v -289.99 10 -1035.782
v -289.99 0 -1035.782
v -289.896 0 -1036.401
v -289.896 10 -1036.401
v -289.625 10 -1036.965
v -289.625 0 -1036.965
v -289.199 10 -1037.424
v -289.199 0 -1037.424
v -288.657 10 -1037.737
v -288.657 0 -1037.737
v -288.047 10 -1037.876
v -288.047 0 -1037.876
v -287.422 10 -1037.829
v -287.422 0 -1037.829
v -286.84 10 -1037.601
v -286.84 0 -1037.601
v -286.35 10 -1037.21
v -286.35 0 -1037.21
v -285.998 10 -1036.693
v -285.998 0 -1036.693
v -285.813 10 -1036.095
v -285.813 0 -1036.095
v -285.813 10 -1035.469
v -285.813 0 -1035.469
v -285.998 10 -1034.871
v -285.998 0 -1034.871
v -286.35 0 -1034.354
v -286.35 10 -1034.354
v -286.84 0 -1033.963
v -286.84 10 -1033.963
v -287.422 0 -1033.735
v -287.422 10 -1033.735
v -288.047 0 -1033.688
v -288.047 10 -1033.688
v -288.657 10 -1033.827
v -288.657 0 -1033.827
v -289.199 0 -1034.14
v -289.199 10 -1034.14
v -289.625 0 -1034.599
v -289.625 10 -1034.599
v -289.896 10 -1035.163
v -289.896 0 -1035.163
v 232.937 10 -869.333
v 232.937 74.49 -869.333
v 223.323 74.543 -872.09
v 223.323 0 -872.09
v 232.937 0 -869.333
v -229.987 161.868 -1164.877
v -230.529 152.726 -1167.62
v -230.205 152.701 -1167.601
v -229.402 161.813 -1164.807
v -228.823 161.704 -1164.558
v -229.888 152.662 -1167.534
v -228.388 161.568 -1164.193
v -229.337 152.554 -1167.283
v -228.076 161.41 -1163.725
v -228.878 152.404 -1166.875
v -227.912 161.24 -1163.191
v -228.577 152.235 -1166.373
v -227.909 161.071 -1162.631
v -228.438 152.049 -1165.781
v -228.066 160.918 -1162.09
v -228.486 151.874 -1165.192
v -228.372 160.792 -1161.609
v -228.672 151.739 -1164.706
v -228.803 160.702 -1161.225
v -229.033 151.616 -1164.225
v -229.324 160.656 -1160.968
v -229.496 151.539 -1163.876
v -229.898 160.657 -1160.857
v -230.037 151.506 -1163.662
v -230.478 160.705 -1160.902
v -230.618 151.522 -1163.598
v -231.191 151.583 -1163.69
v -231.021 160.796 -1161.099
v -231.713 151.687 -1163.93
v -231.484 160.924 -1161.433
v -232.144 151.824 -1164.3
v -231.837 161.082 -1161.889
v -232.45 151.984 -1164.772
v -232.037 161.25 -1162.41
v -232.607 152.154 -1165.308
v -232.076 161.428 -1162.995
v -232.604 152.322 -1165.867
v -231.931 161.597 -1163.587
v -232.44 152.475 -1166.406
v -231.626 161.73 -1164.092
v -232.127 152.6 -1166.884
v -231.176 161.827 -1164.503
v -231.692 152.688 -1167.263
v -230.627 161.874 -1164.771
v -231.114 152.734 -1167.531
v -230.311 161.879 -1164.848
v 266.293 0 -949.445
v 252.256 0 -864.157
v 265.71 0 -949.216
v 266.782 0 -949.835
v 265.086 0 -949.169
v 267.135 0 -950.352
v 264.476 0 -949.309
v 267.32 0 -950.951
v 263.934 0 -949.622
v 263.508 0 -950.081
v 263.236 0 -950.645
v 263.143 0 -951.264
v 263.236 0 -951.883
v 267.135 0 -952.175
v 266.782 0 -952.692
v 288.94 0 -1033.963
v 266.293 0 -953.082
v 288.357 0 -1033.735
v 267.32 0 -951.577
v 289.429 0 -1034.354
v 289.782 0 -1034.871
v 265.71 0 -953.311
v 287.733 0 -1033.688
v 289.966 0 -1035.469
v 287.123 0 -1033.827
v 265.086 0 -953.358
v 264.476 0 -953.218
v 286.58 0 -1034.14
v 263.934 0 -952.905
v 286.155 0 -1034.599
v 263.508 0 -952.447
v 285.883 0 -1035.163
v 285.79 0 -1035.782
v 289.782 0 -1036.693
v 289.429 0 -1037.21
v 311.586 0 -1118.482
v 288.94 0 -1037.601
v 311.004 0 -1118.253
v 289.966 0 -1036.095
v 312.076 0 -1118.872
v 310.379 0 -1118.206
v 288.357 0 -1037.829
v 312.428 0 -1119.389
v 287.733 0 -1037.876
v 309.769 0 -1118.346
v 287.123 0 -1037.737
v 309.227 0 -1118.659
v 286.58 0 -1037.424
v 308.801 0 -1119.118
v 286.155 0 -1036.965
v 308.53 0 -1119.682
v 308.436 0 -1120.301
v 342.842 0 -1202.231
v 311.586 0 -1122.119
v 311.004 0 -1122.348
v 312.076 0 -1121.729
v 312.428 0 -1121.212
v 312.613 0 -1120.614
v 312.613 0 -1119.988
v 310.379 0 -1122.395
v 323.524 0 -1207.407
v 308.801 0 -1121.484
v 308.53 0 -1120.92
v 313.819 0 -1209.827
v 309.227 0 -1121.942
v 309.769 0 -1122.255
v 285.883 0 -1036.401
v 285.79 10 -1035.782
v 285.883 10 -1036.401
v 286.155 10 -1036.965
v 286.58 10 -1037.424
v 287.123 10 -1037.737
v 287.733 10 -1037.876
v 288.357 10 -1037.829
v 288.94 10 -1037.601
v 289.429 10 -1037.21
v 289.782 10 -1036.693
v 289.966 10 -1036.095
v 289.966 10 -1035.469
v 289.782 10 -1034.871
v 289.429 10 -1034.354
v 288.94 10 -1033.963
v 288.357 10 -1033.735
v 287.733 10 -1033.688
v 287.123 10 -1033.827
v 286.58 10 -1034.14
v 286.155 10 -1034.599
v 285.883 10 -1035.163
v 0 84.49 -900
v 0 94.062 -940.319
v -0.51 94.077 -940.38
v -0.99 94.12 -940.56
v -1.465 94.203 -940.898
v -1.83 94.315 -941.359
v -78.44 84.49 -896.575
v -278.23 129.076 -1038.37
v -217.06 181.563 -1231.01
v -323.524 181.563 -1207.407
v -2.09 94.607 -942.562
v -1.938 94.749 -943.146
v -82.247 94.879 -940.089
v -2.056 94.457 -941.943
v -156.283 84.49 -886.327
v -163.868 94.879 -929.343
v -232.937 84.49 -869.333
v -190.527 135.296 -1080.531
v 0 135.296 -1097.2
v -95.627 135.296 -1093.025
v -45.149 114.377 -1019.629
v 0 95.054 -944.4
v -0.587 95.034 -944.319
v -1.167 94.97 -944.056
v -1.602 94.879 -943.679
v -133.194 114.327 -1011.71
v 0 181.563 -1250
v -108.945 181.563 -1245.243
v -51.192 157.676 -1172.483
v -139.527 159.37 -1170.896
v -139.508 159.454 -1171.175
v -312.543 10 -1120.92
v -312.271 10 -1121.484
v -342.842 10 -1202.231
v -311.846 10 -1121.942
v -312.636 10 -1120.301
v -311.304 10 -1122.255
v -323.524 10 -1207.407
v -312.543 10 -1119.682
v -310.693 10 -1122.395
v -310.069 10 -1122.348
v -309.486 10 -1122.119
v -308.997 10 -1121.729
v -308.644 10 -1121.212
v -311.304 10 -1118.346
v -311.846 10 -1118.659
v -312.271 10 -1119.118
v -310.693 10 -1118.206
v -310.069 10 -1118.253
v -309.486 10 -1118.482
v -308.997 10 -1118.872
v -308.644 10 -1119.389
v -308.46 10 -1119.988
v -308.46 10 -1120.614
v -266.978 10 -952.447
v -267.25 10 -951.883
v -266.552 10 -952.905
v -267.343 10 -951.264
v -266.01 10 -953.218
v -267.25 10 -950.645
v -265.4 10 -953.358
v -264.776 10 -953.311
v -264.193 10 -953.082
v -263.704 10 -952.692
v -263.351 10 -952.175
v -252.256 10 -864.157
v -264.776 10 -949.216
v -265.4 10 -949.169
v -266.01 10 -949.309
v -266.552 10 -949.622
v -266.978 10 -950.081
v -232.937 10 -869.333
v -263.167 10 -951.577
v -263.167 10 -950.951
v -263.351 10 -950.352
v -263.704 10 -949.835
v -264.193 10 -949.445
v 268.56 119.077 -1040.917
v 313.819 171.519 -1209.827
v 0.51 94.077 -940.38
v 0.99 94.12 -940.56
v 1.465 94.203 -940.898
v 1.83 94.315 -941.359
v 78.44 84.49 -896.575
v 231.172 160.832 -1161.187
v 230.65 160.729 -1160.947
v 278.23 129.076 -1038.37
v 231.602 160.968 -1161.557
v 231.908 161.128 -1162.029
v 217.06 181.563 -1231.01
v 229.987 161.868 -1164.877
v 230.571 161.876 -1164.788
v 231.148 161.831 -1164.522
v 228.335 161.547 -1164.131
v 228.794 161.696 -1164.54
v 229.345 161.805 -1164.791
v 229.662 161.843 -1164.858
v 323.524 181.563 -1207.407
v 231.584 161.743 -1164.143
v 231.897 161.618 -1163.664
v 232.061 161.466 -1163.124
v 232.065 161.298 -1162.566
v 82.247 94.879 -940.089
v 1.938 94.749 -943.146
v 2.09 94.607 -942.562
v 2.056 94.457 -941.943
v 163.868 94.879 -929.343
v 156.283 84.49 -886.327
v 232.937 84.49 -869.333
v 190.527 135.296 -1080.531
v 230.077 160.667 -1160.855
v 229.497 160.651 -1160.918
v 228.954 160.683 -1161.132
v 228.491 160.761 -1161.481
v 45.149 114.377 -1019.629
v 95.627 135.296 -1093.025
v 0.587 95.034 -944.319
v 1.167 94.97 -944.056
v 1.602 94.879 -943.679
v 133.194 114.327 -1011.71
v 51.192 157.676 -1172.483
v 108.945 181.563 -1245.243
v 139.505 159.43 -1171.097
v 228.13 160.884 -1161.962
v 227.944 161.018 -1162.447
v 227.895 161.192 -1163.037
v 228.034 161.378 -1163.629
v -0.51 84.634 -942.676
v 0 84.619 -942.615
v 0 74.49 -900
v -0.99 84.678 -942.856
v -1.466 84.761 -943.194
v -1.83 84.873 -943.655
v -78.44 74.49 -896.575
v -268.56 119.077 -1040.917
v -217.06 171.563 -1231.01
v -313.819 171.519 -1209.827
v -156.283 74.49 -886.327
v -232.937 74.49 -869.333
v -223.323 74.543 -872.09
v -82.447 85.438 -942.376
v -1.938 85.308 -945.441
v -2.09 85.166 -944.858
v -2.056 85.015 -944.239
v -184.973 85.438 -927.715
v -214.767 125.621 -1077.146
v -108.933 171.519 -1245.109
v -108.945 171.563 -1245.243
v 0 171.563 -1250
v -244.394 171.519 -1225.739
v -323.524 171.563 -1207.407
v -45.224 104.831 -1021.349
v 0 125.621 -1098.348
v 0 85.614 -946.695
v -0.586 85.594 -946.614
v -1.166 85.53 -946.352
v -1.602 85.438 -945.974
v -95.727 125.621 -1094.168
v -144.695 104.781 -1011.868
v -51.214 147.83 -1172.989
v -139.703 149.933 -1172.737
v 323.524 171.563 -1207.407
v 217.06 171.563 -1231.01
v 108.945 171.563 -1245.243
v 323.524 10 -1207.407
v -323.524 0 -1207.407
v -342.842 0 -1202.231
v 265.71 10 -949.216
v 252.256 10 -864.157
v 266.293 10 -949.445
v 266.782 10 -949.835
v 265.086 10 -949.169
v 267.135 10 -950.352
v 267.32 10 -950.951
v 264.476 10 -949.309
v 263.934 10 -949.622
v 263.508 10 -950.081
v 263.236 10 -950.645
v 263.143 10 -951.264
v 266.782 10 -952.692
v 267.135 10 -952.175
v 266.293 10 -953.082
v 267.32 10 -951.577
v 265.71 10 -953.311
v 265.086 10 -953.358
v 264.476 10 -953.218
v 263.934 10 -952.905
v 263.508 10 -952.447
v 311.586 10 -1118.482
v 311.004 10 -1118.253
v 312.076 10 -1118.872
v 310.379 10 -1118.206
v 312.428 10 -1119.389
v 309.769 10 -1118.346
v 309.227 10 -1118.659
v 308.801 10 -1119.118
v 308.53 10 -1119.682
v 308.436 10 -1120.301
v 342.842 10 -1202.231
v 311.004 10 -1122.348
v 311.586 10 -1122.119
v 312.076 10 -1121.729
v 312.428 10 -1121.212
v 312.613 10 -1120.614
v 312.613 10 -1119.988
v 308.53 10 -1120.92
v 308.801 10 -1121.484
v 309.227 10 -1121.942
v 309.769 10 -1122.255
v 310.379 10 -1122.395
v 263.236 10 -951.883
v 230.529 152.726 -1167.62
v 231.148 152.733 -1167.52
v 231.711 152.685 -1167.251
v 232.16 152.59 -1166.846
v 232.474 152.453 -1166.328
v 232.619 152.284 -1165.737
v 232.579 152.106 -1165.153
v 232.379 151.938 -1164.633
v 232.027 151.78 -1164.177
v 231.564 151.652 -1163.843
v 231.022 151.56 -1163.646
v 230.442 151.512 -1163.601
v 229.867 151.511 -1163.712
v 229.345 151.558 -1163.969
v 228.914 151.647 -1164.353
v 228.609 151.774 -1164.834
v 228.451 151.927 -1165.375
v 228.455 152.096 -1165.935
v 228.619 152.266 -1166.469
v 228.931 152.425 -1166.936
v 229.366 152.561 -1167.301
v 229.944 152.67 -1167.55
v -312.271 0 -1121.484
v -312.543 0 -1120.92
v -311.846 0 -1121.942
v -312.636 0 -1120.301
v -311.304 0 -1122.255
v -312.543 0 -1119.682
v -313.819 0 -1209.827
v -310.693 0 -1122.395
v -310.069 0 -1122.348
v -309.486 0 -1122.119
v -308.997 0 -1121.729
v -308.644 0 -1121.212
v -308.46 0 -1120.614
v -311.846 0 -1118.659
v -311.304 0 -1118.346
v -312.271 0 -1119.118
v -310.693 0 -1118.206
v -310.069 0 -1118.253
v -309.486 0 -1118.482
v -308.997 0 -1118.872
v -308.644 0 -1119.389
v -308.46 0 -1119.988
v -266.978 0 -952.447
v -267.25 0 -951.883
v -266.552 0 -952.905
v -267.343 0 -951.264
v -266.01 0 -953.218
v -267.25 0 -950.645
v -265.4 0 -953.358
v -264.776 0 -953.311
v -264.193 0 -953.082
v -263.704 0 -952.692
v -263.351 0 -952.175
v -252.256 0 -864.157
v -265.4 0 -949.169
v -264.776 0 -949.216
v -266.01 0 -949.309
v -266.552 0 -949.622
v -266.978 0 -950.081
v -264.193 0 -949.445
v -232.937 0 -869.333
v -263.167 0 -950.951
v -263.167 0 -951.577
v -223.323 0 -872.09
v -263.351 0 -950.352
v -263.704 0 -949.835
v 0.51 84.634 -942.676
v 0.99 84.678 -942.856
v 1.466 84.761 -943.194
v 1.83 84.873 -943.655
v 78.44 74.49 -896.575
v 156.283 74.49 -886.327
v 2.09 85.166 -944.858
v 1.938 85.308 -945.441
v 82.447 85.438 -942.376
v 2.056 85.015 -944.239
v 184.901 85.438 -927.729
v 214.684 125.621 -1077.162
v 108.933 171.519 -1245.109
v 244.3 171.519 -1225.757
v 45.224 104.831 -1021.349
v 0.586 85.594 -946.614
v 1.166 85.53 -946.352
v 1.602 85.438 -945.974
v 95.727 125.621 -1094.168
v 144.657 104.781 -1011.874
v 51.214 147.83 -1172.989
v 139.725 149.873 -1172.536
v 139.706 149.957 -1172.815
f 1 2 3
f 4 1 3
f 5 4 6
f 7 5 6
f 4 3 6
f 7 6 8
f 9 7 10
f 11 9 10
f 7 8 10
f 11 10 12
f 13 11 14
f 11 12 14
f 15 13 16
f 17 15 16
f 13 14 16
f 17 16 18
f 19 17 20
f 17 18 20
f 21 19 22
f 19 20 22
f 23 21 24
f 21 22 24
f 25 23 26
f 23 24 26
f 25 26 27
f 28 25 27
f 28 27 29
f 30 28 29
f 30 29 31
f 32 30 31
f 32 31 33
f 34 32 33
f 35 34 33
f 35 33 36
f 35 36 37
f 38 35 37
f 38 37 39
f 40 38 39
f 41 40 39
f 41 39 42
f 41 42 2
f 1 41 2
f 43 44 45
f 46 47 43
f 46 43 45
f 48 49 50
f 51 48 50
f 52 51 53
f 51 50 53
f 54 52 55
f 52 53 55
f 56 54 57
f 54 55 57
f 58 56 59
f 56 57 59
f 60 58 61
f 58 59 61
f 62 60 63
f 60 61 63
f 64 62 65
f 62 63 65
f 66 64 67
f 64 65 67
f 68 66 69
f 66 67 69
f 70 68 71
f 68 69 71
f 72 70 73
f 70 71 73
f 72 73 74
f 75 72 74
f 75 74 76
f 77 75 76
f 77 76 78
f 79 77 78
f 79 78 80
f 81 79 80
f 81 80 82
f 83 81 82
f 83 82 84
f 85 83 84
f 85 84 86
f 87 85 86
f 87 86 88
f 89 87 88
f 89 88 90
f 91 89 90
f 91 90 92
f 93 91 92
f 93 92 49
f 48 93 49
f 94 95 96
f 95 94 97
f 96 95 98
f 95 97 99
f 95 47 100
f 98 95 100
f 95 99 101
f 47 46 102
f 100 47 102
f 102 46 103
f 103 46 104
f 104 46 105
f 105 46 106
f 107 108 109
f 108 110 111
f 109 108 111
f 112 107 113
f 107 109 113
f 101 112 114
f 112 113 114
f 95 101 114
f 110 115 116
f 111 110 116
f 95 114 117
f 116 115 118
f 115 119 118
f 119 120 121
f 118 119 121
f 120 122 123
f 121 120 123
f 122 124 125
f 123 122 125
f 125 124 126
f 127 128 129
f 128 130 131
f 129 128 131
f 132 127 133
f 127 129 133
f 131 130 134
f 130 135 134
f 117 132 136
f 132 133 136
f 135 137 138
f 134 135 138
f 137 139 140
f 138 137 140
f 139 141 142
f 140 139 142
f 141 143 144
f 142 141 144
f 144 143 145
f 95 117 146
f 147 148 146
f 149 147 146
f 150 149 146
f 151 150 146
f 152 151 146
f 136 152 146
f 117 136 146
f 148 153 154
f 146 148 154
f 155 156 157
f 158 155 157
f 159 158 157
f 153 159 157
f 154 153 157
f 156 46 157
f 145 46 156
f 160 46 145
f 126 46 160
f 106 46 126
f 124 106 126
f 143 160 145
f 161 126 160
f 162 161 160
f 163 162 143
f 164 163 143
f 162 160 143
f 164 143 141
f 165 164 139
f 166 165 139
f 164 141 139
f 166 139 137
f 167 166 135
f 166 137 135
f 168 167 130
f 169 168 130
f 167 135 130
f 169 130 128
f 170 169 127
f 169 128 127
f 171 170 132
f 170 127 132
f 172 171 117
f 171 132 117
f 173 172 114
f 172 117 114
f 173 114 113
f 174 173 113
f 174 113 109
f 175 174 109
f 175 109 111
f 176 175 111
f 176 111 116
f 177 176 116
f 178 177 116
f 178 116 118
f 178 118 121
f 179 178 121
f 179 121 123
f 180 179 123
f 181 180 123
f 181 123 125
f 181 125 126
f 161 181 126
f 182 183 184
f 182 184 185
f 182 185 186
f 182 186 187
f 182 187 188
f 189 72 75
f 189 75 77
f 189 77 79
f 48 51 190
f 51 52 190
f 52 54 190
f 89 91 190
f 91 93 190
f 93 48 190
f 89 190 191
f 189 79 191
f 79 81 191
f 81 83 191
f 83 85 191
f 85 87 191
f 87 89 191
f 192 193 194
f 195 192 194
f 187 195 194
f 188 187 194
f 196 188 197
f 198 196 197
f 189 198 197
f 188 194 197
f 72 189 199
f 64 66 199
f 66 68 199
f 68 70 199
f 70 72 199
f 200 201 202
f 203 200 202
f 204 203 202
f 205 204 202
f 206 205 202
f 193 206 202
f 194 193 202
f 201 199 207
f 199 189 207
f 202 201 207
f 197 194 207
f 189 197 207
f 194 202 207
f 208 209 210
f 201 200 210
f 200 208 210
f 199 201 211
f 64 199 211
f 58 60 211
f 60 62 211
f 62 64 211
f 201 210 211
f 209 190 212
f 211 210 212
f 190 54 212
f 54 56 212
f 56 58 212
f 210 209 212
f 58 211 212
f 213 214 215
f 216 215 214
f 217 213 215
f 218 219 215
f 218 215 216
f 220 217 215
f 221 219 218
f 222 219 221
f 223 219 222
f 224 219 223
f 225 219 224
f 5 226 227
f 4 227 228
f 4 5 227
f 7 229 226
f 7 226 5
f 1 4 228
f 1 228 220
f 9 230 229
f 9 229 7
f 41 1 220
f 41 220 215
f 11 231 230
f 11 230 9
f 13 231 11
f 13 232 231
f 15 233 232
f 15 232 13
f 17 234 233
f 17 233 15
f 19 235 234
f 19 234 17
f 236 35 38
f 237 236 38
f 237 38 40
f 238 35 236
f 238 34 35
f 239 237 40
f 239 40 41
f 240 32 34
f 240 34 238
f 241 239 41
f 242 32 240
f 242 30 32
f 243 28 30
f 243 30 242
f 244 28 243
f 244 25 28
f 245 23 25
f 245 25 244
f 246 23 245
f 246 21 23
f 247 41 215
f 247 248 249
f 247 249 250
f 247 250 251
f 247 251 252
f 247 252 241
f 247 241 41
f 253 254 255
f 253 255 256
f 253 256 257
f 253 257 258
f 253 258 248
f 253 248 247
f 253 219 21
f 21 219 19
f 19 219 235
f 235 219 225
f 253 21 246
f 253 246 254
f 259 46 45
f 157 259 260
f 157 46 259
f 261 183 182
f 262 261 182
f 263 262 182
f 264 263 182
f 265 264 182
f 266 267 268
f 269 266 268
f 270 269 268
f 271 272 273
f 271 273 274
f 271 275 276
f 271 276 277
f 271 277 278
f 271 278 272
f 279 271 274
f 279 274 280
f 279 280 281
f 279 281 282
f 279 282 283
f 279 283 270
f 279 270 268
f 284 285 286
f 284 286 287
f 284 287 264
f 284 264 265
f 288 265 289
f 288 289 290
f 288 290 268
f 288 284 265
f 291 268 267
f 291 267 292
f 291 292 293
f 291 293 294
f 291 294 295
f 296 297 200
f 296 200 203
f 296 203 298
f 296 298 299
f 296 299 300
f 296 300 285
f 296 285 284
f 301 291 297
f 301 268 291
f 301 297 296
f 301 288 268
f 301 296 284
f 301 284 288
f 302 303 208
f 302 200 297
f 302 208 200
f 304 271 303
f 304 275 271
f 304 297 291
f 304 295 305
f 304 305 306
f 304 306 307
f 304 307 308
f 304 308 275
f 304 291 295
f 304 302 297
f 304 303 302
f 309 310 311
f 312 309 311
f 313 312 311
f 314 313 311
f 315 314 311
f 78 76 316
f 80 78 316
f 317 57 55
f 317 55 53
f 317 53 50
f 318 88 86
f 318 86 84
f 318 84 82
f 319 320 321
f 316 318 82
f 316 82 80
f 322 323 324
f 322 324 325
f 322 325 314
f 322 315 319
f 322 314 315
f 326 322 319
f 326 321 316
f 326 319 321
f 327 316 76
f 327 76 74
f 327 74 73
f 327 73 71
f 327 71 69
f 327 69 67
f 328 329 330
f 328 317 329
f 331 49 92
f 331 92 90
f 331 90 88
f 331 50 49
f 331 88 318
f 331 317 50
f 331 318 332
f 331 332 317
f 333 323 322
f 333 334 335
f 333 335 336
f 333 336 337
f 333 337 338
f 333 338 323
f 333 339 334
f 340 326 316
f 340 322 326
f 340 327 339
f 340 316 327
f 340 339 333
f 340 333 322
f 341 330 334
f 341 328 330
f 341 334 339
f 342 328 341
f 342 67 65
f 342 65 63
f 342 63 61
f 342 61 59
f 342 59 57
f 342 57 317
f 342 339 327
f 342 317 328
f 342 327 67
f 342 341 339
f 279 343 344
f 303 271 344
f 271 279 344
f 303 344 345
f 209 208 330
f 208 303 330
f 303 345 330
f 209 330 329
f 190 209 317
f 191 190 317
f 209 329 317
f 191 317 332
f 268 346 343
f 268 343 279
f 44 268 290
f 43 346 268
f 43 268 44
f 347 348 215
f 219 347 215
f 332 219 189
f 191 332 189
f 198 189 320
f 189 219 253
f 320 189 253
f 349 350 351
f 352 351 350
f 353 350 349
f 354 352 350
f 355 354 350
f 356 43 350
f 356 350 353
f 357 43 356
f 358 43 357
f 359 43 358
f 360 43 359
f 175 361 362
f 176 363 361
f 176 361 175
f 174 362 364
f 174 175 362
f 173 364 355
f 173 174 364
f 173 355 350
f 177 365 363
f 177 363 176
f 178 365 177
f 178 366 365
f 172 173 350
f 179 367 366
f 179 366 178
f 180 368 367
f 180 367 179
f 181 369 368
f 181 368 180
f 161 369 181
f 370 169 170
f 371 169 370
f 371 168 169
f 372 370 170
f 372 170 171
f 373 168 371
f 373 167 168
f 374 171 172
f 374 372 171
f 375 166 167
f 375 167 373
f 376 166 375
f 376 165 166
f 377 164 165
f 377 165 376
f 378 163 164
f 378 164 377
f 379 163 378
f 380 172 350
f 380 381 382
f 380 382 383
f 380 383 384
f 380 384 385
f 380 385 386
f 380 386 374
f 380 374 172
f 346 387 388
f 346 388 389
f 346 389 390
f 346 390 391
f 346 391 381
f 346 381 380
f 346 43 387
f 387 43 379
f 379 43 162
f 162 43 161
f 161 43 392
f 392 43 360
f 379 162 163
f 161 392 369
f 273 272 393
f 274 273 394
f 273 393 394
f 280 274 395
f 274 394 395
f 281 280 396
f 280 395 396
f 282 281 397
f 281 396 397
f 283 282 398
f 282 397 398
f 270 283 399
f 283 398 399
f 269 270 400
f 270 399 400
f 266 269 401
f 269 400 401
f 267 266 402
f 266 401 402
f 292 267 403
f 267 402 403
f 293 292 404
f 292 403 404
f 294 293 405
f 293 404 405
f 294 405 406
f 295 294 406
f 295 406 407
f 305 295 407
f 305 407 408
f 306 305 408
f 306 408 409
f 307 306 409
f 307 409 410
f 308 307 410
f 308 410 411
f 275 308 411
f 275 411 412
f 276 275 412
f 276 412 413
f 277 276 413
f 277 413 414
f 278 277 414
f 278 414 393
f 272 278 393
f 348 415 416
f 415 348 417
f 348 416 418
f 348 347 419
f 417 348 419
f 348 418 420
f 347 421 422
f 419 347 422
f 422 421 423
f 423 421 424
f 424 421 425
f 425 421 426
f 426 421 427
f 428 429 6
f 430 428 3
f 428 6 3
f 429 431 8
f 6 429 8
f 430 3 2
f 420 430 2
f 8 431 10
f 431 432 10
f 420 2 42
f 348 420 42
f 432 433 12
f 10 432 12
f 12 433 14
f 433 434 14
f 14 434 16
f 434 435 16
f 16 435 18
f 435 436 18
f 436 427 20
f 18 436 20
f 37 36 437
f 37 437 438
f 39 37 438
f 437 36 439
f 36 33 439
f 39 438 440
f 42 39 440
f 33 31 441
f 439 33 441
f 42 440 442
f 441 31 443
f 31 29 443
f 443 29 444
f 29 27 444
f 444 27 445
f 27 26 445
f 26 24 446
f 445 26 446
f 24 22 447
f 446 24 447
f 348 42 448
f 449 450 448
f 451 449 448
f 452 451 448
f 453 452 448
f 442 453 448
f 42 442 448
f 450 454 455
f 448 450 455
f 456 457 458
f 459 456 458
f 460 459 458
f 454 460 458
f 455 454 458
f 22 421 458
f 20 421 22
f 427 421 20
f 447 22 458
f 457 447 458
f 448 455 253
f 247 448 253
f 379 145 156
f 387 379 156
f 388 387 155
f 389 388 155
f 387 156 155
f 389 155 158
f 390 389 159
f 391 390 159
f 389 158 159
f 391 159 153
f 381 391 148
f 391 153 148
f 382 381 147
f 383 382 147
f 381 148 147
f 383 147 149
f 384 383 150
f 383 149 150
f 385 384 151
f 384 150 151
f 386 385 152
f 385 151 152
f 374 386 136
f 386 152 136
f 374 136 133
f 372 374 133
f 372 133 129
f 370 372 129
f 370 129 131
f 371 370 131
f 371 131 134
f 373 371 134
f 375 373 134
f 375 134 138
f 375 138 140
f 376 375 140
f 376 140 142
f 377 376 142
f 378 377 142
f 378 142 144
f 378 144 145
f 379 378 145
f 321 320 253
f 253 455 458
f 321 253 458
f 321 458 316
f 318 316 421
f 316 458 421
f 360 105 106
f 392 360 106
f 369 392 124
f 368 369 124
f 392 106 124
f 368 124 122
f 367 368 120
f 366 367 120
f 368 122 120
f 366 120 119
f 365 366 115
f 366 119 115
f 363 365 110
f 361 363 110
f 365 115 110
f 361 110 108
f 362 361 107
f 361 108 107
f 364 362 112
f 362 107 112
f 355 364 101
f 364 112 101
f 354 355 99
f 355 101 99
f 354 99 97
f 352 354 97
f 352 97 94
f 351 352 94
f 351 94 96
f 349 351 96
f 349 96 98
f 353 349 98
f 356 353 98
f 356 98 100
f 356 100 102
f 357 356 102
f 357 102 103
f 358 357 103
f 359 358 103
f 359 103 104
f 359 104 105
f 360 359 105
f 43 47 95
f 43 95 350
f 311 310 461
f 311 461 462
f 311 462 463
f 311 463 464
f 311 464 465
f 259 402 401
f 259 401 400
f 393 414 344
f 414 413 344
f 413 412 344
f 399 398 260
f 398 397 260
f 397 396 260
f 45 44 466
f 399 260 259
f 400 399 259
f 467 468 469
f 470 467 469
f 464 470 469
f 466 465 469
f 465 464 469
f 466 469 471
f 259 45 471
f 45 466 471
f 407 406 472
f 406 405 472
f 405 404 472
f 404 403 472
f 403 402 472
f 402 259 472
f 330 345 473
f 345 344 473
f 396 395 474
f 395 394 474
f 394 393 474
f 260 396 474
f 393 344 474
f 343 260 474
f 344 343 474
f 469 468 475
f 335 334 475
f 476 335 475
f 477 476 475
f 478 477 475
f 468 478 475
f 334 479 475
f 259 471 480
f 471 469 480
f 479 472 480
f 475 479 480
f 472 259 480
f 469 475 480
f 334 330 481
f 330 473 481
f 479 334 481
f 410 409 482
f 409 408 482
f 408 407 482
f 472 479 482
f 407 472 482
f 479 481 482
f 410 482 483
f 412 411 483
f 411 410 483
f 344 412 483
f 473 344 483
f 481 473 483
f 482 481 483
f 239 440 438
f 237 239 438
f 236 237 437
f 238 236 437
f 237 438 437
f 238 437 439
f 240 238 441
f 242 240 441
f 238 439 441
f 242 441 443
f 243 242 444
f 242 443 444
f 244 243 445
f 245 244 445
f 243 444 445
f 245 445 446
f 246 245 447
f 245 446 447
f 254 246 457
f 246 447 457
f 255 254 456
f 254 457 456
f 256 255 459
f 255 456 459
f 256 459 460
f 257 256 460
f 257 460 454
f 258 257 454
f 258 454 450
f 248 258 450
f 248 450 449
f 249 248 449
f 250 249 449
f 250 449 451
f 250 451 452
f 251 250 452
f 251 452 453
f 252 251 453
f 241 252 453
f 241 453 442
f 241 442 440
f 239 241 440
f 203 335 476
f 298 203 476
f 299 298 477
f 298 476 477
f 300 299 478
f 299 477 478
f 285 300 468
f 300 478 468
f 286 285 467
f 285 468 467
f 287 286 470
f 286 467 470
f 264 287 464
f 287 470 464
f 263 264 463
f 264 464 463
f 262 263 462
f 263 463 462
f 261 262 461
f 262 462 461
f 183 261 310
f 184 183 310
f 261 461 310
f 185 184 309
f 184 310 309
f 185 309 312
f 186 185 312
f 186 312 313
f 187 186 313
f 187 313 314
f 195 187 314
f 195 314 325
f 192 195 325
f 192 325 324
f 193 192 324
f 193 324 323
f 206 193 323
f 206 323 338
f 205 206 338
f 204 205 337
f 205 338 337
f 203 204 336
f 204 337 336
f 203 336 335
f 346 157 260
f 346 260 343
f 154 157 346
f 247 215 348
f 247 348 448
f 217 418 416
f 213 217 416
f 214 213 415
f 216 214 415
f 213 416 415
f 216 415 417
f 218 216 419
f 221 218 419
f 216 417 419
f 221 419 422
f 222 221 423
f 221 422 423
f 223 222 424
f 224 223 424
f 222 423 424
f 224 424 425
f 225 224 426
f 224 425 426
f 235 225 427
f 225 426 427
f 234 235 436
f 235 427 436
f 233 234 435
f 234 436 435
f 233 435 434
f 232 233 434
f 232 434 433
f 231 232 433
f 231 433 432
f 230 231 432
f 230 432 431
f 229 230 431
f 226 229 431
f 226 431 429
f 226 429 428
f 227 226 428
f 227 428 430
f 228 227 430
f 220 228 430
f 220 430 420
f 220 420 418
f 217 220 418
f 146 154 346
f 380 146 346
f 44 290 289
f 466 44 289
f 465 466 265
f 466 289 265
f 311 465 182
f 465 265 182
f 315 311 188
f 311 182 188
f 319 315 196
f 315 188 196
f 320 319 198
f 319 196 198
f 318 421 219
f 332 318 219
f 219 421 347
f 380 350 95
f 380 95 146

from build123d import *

# Parameters (mm, degrees)
REVOLVE_1_ANGLE             = 15
REVOLVE_1_OTHER_WAY_ANGLE   = 15
EXTRUDE_1_REACH             = 1305.891
SKETCH_6_W                  = 350.000000001
SKETCH_6_H                  = 10
EXTRUDE_2_DEPTH             = 20
SKETCH_7_W                  = 350.000000001
SKETCH_7_H                  = 10
EXTRUDE_3_DEPTH             = 20
HOLE_WIZARD_M51_D           = 4.2
HOLE_WIZARD_M51_ON_FACE_2_D = 4.2
HOLE_WIZARD_M51_ON_FACE_3_D = 4.2
HOLE_WIZARD_M52_D           = 4.2


with BuildPart() as part:
    # Эскиз2 → Повернуть1 (revolve)
    with BuildSketch(Plane(origin=(0, 0, 0), x_dir=(0, 0, -1), z_dir=(1, 0, 0))):
        with BuildLine():
            Line((1250.000000001, 181.562500008), (1250.000000001, 171.562500008))
            add(Edge.make_bspline(
                [(900, 74.490000004), (1075.000000001, 115.125000006), (1250.000000001, 171.562500008)],
                knots=[0.083425123, 0.083425123, 0.083425123, 0.917676354, 0.917676354, 0.917676354], degree=2))
            Line((900, 74.490000004), (900, 84.490000004))
            add(Edge.make_bspline(
                [(900, 84.490000004), (1075.000000001, 125.125000006), (1250.000000001, 181.562500008)],
                knots=[0.083425123, 0.083425123, 0.083425123, 0.917676354, 0.917676354, 0.917676354], degree=2))
        make_face()
    revolve(axis=Axis((0, 605.286784652, 0), (0, -1, 0)), revolution_arc=REVOLVE_1_ANGLE)

    # Эскиз2 → Повернуть1 other way (revolve)
    with BuildSketch(Plane(origin=(0, 0, 0), x_dir=(0, 0, -1), z_dir=(1, 0, 0))):
        with BuildLine():
            Line((1250.000000001, 181.562500008), (1250.000000001, 171.562500008))
            add(Edge.make_bspline(
                [(900, 74.490000004), (1075.000000001, 115.125000006), (1250.000000001, 171.562500008)],
                knots=[0.083425123, 0.083425123, 0.083425123, 0.917676354, 0.917676354, 0.917676354], degree=2))
            Line((900, 74.490000004), (900, 84.490000004))
            add(Edge.make_bspline(
                [(900, 84.490000004), (1075.000000001, 125.125000006), (1250.000000001, 181.562500008)],
                knots=[0.083425123, 0.083425123, 0.083425123, 0.917676354, 0.917676354, 0.917676354], degree=2))
        make_face()
    revolve(axis=Axis((0, 605.286784652, 0), (0, 1, 0)), revolution_arc=REVOLVE_1_OTHER_WAY_ANGLE)

    # Эскиз5 → Бобышка-Вытянуть1 (add, up to next)
    with BuildSketch(Plane(origin=(0, 0, 0), x_dir=(1, 0, 0), z_dir=(0, 1, 0)), mode=Mode.PRIVATE) as extrude_1_sk1:
        Polygon((-323.523806378, 1207.407282862), (-232.937140592, 869.33324366), (-223.323059362, 872.090037092), (-313.819371083, 1209.826870333), align=None)
    extrude_1_tool1 = extrude(extrude_1_sk1.sketch, amount=EXTRUDE_1_REACH, mode=Mode.PRIVATE) - part.part
    # Эскиз5 → Бобышка-Вытянуть1 (add, up to next)
    with BuildSketch(Plane(origin=(0, 0, 0), x_dir=(1, 0, 0), z_dir=(0, 1, 0)), mode=Mode.PRIVATE) as extrude_1_sk2:
        Polygon((323.523806378, 1207.407282862), (232.937140592, 869.33324366), (223.323059362, 872.090037092), (313.819371083, 1209.826870333), align=None)
    extrude_1_tool2 = extrude(extrude_1_sk2.sketch, amount=EXTRUDE_1_REACH, mode=Mode.PRIVATE) - part.part
    add(extrude_1_tool1.solids().sort_by_distance((-273.401648, 0, -1039.664143))[0])
    add(extrude_1_tool2.solids().sort_by_distance((273.401648, 0, -1039.664143))[0])

    # Эскиз6 → Бобышка-Вытянуть2 (add)
    with BuildSketch(Plane(origin=(0, 0, 0), x_dir=(0.25881904510252135, 0, 0.9659258262890682), z_dir=(-0.9659258262890681, 0, 0.2588190451025213))):
        with Locations((-1075, 5)):
            Rectangle(SKETCH_6_W, SKETCH_6_H)
    extrude(amount=EXTRUDE_2_DEPTH)

    # Эскиз7 → Бобышка-Вытянуть3 (add)
    with BuildSketch(Plane(origin=(0, 0, 0), x_dir=(0.25881904510252124, 0, -0.9659258262890682), z_dir=(0.9659258262890682, 0, 0.25881904510252124))):
        with Locations((1075, 5)):
            Rectangle(SKETCH_7_W, SKETCH_7_H)
    extrude(amount=EXTRUDE_3_DEPTH)

    # Отверстие обработанное метчиком M51 (through all)
    with Locations(Plane(origin=(229.986727308, 161.264444267, -1162.865785876), x_dir=(0, -0.28736490905, 0.957821178011), z_dir=(-0.056742261531, 0.956277993991, 0.286901923948))):
        with Locations((0, 0)):
            Hole(HOLE_WIZARD_M51_D / 2)

    # Отверстие обработанное метчиком M51 on face 2 (through all)
    with Locations(Plane(origin=(-229.986727308, 161.264444267, -1162.865785876), x_dir=(0, -0.287364977278, 0.957821157542), z_dir=(0.056741999278, 0.95627798783, 0.286901996349))):
        with Locations((0, 0)):
            Hole(HOLE_WIZARD_M51_ON_FACE_2_D / 2)

    # Отверстие обработанное метчиком M51 on face 3 (through all)
    with Locations(Plane(origin=(0, 94.55738613, -942.359672798), x_dir=(0, -0.23624700812, 0.971693033398), z_dir=(0, 0.971693033398, 0.23624700812))):
        with Locations((-1e-09, 0)):
            Hole(HOLE_WIZARD_M51_ON_FACE_3_D / 2)

    # Отверстие обработанное метчиком M52 (through all)
    with Locations(Plane(origin=(0, 10, 0), x_dir=(1, 0, 0), z_dir=(0, 1, 0))):
        with Locations((-310.536398195, 1120.300582611), (-287.889731748, 1035.782072811), (-265.243065302, 951.26356301), (310.536398196, 1120.300582611), (287.889731751, 1035.78207281), (265.243065306, 951.263563009)):
            Hole(HOLE_WIZARD_M52_D / 2)


solid = part.part
